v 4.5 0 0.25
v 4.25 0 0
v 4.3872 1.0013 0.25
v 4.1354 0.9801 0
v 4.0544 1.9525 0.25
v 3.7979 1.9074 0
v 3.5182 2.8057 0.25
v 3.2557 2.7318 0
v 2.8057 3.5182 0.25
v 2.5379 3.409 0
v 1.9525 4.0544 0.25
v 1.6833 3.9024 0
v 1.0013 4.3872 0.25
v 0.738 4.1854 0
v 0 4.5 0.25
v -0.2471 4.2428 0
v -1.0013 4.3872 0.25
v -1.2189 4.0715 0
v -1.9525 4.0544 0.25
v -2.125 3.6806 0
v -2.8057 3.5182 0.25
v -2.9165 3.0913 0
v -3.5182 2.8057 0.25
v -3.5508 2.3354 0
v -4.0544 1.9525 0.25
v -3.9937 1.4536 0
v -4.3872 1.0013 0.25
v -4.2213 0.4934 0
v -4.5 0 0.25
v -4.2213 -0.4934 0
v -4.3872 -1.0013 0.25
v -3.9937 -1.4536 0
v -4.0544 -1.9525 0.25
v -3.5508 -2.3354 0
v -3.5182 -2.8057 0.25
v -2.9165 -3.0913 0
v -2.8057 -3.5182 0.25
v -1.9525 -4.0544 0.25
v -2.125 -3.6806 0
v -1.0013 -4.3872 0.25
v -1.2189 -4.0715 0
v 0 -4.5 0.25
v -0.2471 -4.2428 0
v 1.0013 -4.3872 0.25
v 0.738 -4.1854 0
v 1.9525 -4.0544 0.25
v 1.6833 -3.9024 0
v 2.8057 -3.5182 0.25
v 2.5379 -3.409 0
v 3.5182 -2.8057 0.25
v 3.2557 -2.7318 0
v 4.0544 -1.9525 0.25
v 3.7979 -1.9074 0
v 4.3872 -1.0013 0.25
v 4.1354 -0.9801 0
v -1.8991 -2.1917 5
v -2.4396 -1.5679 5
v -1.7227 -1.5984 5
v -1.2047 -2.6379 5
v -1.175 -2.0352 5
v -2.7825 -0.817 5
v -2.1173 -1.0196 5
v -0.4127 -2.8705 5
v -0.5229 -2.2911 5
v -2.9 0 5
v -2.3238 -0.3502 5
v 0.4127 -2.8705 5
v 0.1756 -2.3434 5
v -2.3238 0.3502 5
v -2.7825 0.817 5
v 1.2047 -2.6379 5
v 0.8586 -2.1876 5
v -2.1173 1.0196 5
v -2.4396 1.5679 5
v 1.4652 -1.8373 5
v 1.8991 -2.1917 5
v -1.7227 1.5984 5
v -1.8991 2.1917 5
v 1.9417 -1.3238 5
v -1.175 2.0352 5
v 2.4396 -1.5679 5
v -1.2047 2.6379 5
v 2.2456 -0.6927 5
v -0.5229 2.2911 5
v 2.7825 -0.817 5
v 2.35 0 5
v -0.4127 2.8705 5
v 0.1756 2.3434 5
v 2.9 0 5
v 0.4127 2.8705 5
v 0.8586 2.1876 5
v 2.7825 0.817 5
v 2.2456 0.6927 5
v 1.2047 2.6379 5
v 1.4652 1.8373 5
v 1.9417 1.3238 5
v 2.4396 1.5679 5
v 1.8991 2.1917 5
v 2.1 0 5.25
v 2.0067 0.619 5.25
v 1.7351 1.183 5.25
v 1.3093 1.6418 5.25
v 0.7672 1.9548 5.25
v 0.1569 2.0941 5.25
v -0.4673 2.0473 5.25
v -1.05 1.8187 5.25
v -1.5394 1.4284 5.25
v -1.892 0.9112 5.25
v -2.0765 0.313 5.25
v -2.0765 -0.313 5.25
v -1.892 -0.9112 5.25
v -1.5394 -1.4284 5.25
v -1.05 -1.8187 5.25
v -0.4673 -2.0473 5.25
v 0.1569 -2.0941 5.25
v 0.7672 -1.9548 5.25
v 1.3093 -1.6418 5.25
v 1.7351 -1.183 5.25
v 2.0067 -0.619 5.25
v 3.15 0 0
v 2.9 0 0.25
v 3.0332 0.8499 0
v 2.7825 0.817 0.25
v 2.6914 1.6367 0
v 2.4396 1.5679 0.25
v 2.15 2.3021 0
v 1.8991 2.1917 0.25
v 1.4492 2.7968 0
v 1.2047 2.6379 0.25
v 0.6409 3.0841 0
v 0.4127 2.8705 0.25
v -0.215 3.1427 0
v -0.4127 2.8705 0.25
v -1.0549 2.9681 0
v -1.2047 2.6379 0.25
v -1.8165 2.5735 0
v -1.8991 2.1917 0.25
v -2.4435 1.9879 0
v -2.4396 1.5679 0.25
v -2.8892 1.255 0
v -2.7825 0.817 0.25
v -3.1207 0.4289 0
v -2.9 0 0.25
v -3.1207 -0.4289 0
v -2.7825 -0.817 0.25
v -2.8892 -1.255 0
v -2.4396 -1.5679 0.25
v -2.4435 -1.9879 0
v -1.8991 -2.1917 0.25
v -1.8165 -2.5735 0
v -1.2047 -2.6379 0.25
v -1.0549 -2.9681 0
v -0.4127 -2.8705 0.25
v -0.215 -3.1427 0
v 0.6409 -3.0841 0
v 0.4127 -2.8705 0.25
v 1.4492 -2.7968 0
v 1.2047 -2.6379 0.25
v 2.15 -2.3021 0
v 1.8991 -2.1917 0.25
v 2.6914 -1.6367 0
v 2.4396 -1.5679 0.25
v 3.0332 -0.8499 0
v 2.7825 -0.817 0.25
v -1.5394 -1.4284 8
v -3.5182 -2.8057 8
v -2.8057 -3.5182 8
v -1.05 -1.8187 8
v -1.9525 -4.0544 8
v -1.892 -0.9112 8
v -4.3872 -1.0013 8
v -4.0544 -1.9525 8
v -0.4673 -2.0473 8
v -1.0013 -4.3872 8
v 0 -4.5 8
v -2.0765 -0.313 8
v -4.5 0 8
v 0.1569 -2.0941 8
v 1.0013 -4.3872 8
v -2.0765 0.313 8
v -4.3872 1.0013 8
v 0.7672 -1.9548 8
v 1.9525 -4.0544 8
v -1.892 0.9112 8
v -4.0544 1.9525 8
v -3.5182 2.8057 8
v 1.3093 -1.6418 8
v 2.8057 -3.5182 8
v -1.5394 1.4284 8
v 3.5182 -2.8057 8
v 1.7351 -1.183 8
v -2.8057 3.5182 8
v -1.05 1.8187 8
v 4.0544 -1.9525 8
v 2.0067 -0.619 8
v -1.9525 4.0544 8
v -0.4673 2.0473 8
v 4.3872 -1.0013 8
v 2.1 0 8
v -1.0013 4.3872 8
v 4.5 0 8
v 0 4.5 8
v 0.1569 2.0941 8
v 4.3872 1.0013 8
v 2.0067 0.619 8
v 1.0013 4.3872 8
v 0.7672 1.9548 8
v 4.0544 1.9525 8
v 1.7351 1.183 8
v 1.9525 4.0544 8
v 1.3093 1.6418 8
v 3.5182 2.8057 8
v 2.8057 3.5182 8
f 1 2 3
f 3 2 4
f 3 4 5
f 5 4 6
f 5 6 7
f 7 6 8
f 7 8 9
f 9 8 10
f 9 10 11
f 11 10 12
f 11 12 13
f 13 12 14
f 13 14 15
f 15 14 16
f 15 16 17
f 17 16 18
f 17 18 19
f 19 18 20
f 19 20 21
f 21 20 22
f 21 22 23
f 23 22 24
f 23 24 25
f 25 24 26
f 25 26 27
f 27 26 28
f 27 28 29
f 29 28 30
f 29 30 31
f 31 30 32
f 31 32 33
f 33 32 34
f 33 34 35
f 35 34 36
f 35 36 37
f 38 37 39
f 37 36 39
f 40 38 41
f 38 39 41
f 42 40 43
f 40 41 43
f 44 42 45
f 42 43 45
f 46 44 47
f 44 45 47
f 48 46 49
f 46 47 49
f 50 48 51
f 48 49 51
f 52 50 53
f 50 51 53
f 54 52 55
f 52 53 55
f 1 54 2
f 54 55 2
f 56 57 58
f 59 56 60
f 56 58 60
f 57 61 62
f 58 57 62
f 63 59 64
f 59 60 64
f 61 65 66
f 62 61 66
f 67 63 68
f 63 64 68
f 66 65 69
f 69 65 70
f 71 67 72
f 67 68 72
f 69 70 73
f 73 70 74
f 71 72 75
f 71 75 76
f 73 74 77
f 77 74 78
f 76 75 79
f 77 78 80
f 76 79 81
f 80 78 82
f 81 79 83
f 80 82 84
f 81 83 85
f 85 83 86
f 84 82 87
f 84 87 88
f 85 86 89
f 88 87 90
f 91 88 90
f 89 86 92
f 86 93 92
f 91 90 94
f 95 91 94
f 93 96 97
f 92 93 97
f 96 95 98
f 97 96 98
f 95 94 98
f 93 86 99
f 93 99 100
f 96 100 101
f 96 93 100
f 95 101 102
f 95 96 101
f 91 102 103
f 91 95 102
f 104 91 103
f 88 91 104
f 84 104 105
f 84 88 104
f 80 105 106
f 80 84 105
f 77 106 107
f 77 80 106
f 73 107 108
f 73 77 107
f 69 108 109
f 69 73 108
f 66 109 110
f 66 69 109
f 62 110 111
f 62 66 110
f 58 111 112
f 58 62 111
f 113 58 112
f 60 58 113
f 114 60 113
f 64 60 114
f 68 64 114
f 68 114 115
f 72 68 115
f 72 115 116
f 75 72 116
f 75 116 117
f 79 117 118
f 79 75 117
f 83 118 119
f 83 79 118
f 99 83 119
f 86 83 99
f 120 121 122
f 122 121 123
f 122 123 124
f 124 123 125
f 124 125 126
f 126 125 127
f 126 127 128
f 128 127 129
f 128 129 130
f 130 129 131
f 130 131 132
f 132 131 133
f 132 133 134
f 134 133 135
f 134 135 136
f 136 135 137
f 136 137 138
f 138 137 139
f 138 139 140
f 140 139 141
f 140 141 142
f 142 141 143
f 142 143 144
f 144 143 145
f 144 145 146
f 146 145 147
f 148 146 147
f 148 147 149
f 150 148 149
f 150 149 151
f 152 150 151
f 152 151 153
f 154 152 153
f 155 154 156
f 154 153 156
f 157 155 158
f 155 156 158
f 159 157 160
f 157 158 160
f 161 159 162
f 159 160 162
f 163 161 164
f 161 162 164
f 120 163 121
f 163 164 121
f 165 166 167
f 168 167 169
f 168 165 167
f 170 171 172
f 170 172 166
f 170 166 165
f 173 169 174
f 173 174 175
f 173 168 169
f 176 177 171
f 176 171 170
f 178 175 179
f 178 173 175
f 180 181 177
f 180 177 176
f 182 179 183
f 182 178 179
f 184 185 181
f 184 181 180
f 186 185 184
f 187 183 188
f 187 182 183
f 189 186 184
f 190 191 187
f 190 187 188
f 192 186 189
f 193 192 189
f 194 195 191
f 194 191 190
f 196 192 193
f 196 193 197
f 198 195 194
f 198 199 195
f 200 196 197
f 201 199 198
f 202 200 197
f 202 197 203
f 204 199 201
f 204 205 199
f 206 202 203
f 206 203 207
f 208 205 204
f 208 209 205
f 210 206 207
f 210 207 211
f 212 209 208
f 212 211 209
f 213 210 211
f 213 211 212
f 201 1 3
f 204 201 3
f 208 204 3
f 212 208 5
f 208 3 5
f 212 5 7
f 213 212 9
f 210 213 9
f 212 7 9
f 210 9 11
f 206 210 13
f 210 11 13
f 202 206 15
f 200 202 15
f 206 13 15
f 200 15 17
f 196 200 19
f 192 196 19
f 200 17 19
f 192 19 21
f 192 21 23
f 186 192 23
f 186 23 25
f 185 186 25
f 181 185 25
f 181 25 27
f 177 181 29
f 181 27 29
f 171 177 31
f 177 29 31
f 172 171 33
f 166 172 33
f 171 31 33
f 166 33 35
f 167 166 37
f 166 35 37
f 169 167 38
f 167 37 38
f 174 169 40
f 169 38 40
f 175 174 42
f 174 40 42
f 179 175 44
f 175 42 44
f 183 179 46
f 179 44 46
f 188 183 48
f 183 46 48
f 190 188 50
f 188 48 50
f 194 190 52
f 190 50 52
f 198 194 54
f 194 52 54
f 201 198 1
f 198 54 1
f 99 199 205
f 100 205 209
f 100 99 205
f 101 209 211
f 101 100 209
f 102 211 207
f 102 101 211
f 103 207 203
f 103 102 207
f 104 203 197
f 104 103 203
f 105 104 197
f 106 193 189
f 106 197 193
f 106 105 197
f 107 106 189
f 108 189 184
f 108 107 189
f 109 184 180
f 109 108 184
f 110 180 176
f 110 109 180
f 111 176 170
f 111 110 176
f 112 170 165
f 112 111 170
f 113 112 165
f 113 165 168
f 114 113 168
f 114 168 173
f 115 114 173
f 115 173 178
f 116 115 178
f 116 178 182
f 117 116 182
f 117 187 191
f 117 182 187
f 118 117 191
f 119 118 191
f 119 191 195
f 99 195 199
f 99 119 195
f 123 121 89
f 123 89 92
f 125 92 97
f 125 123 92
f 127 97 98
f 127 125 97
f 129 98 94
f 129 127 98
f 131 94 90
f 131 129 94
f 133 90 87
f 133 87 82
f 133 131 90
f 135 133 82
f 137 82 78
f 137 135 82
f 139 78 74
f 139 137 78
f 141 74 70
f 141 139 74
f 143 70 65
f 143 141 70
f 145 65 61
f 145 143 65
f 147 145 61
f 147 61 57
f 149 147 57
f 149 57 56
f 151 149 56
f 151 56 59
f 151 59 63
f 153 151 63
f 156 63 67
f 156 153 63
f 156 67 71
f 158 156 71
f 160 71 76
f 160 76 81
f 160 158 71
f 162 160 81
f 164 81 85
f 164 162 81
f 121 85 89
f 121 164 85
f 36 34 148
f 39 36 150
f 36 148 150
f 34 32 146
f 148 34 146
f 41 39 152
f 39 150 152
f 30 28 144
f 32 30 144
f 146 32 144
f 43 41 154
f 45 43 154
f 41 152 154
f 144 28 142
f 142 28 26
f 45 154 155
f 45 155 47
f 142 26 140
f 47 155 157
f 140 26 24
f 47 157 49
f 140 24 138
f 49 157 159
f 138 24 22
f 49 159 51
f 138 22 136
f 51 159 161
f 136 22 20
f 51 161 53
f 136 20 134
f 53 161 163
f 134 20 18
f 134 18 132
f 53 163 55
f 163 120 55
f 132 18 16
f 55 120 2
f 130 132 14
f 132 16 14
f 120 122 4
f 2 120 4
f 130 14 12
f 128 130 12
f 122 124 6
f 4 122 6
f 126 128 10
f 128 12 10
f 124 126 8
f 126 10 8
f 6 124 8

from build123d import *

# Parameters (mm, degrees)
F0_R     = 4.5
F0_R_2   = 2.9
F0_R_3   = 2.1
F1_DEPTH = 8
F2_DEPTH = 8.001
F3_DEPTH = 5
F4_SIZE  = 0.25


with BuildPart() as f1:
    # F0 (on Top) → F1 (new body)
    with BuildSketch(Plane.XY):
        Circle(F0_R)
        Circle(F0_R_2, mode=Mode.SUBTRACT)
        Circle(F0_R_2)
        Circle(F0_R_3, mode=Mode.SUBTRACT)
        Circle(F0_R_3)
    extrude(amount=F1_DEPTH)

    # F0 (on Top) → F2 (cut, through all)
    with BuildSketch(Plane.XY):
        Circle(F0_R_3)
    extrude(amount=F2_DEPTH, mode=Mode.SUBTRACT)

    # F0 (on Top) → F3 (cut)
    with BuildSketch(Plane.XY):
        Circle(F0_R_2)
        Circle(F0_R_3, mode=Mode.SUBTRACT)
    extrude(amount=F3_DEPTH, mode=Mode.SUBTRACT)

    # F4
    f4_edges = [f1.edges().sort_by_distance(p)[0] for p in [
        (-2.1, 0, 5),
        (-2.9, 0, 0),
        (-4.5, 0, 0),
    ]]
    chamfer(f4_edges, length=F4_SIZE)


solid = f1.part
